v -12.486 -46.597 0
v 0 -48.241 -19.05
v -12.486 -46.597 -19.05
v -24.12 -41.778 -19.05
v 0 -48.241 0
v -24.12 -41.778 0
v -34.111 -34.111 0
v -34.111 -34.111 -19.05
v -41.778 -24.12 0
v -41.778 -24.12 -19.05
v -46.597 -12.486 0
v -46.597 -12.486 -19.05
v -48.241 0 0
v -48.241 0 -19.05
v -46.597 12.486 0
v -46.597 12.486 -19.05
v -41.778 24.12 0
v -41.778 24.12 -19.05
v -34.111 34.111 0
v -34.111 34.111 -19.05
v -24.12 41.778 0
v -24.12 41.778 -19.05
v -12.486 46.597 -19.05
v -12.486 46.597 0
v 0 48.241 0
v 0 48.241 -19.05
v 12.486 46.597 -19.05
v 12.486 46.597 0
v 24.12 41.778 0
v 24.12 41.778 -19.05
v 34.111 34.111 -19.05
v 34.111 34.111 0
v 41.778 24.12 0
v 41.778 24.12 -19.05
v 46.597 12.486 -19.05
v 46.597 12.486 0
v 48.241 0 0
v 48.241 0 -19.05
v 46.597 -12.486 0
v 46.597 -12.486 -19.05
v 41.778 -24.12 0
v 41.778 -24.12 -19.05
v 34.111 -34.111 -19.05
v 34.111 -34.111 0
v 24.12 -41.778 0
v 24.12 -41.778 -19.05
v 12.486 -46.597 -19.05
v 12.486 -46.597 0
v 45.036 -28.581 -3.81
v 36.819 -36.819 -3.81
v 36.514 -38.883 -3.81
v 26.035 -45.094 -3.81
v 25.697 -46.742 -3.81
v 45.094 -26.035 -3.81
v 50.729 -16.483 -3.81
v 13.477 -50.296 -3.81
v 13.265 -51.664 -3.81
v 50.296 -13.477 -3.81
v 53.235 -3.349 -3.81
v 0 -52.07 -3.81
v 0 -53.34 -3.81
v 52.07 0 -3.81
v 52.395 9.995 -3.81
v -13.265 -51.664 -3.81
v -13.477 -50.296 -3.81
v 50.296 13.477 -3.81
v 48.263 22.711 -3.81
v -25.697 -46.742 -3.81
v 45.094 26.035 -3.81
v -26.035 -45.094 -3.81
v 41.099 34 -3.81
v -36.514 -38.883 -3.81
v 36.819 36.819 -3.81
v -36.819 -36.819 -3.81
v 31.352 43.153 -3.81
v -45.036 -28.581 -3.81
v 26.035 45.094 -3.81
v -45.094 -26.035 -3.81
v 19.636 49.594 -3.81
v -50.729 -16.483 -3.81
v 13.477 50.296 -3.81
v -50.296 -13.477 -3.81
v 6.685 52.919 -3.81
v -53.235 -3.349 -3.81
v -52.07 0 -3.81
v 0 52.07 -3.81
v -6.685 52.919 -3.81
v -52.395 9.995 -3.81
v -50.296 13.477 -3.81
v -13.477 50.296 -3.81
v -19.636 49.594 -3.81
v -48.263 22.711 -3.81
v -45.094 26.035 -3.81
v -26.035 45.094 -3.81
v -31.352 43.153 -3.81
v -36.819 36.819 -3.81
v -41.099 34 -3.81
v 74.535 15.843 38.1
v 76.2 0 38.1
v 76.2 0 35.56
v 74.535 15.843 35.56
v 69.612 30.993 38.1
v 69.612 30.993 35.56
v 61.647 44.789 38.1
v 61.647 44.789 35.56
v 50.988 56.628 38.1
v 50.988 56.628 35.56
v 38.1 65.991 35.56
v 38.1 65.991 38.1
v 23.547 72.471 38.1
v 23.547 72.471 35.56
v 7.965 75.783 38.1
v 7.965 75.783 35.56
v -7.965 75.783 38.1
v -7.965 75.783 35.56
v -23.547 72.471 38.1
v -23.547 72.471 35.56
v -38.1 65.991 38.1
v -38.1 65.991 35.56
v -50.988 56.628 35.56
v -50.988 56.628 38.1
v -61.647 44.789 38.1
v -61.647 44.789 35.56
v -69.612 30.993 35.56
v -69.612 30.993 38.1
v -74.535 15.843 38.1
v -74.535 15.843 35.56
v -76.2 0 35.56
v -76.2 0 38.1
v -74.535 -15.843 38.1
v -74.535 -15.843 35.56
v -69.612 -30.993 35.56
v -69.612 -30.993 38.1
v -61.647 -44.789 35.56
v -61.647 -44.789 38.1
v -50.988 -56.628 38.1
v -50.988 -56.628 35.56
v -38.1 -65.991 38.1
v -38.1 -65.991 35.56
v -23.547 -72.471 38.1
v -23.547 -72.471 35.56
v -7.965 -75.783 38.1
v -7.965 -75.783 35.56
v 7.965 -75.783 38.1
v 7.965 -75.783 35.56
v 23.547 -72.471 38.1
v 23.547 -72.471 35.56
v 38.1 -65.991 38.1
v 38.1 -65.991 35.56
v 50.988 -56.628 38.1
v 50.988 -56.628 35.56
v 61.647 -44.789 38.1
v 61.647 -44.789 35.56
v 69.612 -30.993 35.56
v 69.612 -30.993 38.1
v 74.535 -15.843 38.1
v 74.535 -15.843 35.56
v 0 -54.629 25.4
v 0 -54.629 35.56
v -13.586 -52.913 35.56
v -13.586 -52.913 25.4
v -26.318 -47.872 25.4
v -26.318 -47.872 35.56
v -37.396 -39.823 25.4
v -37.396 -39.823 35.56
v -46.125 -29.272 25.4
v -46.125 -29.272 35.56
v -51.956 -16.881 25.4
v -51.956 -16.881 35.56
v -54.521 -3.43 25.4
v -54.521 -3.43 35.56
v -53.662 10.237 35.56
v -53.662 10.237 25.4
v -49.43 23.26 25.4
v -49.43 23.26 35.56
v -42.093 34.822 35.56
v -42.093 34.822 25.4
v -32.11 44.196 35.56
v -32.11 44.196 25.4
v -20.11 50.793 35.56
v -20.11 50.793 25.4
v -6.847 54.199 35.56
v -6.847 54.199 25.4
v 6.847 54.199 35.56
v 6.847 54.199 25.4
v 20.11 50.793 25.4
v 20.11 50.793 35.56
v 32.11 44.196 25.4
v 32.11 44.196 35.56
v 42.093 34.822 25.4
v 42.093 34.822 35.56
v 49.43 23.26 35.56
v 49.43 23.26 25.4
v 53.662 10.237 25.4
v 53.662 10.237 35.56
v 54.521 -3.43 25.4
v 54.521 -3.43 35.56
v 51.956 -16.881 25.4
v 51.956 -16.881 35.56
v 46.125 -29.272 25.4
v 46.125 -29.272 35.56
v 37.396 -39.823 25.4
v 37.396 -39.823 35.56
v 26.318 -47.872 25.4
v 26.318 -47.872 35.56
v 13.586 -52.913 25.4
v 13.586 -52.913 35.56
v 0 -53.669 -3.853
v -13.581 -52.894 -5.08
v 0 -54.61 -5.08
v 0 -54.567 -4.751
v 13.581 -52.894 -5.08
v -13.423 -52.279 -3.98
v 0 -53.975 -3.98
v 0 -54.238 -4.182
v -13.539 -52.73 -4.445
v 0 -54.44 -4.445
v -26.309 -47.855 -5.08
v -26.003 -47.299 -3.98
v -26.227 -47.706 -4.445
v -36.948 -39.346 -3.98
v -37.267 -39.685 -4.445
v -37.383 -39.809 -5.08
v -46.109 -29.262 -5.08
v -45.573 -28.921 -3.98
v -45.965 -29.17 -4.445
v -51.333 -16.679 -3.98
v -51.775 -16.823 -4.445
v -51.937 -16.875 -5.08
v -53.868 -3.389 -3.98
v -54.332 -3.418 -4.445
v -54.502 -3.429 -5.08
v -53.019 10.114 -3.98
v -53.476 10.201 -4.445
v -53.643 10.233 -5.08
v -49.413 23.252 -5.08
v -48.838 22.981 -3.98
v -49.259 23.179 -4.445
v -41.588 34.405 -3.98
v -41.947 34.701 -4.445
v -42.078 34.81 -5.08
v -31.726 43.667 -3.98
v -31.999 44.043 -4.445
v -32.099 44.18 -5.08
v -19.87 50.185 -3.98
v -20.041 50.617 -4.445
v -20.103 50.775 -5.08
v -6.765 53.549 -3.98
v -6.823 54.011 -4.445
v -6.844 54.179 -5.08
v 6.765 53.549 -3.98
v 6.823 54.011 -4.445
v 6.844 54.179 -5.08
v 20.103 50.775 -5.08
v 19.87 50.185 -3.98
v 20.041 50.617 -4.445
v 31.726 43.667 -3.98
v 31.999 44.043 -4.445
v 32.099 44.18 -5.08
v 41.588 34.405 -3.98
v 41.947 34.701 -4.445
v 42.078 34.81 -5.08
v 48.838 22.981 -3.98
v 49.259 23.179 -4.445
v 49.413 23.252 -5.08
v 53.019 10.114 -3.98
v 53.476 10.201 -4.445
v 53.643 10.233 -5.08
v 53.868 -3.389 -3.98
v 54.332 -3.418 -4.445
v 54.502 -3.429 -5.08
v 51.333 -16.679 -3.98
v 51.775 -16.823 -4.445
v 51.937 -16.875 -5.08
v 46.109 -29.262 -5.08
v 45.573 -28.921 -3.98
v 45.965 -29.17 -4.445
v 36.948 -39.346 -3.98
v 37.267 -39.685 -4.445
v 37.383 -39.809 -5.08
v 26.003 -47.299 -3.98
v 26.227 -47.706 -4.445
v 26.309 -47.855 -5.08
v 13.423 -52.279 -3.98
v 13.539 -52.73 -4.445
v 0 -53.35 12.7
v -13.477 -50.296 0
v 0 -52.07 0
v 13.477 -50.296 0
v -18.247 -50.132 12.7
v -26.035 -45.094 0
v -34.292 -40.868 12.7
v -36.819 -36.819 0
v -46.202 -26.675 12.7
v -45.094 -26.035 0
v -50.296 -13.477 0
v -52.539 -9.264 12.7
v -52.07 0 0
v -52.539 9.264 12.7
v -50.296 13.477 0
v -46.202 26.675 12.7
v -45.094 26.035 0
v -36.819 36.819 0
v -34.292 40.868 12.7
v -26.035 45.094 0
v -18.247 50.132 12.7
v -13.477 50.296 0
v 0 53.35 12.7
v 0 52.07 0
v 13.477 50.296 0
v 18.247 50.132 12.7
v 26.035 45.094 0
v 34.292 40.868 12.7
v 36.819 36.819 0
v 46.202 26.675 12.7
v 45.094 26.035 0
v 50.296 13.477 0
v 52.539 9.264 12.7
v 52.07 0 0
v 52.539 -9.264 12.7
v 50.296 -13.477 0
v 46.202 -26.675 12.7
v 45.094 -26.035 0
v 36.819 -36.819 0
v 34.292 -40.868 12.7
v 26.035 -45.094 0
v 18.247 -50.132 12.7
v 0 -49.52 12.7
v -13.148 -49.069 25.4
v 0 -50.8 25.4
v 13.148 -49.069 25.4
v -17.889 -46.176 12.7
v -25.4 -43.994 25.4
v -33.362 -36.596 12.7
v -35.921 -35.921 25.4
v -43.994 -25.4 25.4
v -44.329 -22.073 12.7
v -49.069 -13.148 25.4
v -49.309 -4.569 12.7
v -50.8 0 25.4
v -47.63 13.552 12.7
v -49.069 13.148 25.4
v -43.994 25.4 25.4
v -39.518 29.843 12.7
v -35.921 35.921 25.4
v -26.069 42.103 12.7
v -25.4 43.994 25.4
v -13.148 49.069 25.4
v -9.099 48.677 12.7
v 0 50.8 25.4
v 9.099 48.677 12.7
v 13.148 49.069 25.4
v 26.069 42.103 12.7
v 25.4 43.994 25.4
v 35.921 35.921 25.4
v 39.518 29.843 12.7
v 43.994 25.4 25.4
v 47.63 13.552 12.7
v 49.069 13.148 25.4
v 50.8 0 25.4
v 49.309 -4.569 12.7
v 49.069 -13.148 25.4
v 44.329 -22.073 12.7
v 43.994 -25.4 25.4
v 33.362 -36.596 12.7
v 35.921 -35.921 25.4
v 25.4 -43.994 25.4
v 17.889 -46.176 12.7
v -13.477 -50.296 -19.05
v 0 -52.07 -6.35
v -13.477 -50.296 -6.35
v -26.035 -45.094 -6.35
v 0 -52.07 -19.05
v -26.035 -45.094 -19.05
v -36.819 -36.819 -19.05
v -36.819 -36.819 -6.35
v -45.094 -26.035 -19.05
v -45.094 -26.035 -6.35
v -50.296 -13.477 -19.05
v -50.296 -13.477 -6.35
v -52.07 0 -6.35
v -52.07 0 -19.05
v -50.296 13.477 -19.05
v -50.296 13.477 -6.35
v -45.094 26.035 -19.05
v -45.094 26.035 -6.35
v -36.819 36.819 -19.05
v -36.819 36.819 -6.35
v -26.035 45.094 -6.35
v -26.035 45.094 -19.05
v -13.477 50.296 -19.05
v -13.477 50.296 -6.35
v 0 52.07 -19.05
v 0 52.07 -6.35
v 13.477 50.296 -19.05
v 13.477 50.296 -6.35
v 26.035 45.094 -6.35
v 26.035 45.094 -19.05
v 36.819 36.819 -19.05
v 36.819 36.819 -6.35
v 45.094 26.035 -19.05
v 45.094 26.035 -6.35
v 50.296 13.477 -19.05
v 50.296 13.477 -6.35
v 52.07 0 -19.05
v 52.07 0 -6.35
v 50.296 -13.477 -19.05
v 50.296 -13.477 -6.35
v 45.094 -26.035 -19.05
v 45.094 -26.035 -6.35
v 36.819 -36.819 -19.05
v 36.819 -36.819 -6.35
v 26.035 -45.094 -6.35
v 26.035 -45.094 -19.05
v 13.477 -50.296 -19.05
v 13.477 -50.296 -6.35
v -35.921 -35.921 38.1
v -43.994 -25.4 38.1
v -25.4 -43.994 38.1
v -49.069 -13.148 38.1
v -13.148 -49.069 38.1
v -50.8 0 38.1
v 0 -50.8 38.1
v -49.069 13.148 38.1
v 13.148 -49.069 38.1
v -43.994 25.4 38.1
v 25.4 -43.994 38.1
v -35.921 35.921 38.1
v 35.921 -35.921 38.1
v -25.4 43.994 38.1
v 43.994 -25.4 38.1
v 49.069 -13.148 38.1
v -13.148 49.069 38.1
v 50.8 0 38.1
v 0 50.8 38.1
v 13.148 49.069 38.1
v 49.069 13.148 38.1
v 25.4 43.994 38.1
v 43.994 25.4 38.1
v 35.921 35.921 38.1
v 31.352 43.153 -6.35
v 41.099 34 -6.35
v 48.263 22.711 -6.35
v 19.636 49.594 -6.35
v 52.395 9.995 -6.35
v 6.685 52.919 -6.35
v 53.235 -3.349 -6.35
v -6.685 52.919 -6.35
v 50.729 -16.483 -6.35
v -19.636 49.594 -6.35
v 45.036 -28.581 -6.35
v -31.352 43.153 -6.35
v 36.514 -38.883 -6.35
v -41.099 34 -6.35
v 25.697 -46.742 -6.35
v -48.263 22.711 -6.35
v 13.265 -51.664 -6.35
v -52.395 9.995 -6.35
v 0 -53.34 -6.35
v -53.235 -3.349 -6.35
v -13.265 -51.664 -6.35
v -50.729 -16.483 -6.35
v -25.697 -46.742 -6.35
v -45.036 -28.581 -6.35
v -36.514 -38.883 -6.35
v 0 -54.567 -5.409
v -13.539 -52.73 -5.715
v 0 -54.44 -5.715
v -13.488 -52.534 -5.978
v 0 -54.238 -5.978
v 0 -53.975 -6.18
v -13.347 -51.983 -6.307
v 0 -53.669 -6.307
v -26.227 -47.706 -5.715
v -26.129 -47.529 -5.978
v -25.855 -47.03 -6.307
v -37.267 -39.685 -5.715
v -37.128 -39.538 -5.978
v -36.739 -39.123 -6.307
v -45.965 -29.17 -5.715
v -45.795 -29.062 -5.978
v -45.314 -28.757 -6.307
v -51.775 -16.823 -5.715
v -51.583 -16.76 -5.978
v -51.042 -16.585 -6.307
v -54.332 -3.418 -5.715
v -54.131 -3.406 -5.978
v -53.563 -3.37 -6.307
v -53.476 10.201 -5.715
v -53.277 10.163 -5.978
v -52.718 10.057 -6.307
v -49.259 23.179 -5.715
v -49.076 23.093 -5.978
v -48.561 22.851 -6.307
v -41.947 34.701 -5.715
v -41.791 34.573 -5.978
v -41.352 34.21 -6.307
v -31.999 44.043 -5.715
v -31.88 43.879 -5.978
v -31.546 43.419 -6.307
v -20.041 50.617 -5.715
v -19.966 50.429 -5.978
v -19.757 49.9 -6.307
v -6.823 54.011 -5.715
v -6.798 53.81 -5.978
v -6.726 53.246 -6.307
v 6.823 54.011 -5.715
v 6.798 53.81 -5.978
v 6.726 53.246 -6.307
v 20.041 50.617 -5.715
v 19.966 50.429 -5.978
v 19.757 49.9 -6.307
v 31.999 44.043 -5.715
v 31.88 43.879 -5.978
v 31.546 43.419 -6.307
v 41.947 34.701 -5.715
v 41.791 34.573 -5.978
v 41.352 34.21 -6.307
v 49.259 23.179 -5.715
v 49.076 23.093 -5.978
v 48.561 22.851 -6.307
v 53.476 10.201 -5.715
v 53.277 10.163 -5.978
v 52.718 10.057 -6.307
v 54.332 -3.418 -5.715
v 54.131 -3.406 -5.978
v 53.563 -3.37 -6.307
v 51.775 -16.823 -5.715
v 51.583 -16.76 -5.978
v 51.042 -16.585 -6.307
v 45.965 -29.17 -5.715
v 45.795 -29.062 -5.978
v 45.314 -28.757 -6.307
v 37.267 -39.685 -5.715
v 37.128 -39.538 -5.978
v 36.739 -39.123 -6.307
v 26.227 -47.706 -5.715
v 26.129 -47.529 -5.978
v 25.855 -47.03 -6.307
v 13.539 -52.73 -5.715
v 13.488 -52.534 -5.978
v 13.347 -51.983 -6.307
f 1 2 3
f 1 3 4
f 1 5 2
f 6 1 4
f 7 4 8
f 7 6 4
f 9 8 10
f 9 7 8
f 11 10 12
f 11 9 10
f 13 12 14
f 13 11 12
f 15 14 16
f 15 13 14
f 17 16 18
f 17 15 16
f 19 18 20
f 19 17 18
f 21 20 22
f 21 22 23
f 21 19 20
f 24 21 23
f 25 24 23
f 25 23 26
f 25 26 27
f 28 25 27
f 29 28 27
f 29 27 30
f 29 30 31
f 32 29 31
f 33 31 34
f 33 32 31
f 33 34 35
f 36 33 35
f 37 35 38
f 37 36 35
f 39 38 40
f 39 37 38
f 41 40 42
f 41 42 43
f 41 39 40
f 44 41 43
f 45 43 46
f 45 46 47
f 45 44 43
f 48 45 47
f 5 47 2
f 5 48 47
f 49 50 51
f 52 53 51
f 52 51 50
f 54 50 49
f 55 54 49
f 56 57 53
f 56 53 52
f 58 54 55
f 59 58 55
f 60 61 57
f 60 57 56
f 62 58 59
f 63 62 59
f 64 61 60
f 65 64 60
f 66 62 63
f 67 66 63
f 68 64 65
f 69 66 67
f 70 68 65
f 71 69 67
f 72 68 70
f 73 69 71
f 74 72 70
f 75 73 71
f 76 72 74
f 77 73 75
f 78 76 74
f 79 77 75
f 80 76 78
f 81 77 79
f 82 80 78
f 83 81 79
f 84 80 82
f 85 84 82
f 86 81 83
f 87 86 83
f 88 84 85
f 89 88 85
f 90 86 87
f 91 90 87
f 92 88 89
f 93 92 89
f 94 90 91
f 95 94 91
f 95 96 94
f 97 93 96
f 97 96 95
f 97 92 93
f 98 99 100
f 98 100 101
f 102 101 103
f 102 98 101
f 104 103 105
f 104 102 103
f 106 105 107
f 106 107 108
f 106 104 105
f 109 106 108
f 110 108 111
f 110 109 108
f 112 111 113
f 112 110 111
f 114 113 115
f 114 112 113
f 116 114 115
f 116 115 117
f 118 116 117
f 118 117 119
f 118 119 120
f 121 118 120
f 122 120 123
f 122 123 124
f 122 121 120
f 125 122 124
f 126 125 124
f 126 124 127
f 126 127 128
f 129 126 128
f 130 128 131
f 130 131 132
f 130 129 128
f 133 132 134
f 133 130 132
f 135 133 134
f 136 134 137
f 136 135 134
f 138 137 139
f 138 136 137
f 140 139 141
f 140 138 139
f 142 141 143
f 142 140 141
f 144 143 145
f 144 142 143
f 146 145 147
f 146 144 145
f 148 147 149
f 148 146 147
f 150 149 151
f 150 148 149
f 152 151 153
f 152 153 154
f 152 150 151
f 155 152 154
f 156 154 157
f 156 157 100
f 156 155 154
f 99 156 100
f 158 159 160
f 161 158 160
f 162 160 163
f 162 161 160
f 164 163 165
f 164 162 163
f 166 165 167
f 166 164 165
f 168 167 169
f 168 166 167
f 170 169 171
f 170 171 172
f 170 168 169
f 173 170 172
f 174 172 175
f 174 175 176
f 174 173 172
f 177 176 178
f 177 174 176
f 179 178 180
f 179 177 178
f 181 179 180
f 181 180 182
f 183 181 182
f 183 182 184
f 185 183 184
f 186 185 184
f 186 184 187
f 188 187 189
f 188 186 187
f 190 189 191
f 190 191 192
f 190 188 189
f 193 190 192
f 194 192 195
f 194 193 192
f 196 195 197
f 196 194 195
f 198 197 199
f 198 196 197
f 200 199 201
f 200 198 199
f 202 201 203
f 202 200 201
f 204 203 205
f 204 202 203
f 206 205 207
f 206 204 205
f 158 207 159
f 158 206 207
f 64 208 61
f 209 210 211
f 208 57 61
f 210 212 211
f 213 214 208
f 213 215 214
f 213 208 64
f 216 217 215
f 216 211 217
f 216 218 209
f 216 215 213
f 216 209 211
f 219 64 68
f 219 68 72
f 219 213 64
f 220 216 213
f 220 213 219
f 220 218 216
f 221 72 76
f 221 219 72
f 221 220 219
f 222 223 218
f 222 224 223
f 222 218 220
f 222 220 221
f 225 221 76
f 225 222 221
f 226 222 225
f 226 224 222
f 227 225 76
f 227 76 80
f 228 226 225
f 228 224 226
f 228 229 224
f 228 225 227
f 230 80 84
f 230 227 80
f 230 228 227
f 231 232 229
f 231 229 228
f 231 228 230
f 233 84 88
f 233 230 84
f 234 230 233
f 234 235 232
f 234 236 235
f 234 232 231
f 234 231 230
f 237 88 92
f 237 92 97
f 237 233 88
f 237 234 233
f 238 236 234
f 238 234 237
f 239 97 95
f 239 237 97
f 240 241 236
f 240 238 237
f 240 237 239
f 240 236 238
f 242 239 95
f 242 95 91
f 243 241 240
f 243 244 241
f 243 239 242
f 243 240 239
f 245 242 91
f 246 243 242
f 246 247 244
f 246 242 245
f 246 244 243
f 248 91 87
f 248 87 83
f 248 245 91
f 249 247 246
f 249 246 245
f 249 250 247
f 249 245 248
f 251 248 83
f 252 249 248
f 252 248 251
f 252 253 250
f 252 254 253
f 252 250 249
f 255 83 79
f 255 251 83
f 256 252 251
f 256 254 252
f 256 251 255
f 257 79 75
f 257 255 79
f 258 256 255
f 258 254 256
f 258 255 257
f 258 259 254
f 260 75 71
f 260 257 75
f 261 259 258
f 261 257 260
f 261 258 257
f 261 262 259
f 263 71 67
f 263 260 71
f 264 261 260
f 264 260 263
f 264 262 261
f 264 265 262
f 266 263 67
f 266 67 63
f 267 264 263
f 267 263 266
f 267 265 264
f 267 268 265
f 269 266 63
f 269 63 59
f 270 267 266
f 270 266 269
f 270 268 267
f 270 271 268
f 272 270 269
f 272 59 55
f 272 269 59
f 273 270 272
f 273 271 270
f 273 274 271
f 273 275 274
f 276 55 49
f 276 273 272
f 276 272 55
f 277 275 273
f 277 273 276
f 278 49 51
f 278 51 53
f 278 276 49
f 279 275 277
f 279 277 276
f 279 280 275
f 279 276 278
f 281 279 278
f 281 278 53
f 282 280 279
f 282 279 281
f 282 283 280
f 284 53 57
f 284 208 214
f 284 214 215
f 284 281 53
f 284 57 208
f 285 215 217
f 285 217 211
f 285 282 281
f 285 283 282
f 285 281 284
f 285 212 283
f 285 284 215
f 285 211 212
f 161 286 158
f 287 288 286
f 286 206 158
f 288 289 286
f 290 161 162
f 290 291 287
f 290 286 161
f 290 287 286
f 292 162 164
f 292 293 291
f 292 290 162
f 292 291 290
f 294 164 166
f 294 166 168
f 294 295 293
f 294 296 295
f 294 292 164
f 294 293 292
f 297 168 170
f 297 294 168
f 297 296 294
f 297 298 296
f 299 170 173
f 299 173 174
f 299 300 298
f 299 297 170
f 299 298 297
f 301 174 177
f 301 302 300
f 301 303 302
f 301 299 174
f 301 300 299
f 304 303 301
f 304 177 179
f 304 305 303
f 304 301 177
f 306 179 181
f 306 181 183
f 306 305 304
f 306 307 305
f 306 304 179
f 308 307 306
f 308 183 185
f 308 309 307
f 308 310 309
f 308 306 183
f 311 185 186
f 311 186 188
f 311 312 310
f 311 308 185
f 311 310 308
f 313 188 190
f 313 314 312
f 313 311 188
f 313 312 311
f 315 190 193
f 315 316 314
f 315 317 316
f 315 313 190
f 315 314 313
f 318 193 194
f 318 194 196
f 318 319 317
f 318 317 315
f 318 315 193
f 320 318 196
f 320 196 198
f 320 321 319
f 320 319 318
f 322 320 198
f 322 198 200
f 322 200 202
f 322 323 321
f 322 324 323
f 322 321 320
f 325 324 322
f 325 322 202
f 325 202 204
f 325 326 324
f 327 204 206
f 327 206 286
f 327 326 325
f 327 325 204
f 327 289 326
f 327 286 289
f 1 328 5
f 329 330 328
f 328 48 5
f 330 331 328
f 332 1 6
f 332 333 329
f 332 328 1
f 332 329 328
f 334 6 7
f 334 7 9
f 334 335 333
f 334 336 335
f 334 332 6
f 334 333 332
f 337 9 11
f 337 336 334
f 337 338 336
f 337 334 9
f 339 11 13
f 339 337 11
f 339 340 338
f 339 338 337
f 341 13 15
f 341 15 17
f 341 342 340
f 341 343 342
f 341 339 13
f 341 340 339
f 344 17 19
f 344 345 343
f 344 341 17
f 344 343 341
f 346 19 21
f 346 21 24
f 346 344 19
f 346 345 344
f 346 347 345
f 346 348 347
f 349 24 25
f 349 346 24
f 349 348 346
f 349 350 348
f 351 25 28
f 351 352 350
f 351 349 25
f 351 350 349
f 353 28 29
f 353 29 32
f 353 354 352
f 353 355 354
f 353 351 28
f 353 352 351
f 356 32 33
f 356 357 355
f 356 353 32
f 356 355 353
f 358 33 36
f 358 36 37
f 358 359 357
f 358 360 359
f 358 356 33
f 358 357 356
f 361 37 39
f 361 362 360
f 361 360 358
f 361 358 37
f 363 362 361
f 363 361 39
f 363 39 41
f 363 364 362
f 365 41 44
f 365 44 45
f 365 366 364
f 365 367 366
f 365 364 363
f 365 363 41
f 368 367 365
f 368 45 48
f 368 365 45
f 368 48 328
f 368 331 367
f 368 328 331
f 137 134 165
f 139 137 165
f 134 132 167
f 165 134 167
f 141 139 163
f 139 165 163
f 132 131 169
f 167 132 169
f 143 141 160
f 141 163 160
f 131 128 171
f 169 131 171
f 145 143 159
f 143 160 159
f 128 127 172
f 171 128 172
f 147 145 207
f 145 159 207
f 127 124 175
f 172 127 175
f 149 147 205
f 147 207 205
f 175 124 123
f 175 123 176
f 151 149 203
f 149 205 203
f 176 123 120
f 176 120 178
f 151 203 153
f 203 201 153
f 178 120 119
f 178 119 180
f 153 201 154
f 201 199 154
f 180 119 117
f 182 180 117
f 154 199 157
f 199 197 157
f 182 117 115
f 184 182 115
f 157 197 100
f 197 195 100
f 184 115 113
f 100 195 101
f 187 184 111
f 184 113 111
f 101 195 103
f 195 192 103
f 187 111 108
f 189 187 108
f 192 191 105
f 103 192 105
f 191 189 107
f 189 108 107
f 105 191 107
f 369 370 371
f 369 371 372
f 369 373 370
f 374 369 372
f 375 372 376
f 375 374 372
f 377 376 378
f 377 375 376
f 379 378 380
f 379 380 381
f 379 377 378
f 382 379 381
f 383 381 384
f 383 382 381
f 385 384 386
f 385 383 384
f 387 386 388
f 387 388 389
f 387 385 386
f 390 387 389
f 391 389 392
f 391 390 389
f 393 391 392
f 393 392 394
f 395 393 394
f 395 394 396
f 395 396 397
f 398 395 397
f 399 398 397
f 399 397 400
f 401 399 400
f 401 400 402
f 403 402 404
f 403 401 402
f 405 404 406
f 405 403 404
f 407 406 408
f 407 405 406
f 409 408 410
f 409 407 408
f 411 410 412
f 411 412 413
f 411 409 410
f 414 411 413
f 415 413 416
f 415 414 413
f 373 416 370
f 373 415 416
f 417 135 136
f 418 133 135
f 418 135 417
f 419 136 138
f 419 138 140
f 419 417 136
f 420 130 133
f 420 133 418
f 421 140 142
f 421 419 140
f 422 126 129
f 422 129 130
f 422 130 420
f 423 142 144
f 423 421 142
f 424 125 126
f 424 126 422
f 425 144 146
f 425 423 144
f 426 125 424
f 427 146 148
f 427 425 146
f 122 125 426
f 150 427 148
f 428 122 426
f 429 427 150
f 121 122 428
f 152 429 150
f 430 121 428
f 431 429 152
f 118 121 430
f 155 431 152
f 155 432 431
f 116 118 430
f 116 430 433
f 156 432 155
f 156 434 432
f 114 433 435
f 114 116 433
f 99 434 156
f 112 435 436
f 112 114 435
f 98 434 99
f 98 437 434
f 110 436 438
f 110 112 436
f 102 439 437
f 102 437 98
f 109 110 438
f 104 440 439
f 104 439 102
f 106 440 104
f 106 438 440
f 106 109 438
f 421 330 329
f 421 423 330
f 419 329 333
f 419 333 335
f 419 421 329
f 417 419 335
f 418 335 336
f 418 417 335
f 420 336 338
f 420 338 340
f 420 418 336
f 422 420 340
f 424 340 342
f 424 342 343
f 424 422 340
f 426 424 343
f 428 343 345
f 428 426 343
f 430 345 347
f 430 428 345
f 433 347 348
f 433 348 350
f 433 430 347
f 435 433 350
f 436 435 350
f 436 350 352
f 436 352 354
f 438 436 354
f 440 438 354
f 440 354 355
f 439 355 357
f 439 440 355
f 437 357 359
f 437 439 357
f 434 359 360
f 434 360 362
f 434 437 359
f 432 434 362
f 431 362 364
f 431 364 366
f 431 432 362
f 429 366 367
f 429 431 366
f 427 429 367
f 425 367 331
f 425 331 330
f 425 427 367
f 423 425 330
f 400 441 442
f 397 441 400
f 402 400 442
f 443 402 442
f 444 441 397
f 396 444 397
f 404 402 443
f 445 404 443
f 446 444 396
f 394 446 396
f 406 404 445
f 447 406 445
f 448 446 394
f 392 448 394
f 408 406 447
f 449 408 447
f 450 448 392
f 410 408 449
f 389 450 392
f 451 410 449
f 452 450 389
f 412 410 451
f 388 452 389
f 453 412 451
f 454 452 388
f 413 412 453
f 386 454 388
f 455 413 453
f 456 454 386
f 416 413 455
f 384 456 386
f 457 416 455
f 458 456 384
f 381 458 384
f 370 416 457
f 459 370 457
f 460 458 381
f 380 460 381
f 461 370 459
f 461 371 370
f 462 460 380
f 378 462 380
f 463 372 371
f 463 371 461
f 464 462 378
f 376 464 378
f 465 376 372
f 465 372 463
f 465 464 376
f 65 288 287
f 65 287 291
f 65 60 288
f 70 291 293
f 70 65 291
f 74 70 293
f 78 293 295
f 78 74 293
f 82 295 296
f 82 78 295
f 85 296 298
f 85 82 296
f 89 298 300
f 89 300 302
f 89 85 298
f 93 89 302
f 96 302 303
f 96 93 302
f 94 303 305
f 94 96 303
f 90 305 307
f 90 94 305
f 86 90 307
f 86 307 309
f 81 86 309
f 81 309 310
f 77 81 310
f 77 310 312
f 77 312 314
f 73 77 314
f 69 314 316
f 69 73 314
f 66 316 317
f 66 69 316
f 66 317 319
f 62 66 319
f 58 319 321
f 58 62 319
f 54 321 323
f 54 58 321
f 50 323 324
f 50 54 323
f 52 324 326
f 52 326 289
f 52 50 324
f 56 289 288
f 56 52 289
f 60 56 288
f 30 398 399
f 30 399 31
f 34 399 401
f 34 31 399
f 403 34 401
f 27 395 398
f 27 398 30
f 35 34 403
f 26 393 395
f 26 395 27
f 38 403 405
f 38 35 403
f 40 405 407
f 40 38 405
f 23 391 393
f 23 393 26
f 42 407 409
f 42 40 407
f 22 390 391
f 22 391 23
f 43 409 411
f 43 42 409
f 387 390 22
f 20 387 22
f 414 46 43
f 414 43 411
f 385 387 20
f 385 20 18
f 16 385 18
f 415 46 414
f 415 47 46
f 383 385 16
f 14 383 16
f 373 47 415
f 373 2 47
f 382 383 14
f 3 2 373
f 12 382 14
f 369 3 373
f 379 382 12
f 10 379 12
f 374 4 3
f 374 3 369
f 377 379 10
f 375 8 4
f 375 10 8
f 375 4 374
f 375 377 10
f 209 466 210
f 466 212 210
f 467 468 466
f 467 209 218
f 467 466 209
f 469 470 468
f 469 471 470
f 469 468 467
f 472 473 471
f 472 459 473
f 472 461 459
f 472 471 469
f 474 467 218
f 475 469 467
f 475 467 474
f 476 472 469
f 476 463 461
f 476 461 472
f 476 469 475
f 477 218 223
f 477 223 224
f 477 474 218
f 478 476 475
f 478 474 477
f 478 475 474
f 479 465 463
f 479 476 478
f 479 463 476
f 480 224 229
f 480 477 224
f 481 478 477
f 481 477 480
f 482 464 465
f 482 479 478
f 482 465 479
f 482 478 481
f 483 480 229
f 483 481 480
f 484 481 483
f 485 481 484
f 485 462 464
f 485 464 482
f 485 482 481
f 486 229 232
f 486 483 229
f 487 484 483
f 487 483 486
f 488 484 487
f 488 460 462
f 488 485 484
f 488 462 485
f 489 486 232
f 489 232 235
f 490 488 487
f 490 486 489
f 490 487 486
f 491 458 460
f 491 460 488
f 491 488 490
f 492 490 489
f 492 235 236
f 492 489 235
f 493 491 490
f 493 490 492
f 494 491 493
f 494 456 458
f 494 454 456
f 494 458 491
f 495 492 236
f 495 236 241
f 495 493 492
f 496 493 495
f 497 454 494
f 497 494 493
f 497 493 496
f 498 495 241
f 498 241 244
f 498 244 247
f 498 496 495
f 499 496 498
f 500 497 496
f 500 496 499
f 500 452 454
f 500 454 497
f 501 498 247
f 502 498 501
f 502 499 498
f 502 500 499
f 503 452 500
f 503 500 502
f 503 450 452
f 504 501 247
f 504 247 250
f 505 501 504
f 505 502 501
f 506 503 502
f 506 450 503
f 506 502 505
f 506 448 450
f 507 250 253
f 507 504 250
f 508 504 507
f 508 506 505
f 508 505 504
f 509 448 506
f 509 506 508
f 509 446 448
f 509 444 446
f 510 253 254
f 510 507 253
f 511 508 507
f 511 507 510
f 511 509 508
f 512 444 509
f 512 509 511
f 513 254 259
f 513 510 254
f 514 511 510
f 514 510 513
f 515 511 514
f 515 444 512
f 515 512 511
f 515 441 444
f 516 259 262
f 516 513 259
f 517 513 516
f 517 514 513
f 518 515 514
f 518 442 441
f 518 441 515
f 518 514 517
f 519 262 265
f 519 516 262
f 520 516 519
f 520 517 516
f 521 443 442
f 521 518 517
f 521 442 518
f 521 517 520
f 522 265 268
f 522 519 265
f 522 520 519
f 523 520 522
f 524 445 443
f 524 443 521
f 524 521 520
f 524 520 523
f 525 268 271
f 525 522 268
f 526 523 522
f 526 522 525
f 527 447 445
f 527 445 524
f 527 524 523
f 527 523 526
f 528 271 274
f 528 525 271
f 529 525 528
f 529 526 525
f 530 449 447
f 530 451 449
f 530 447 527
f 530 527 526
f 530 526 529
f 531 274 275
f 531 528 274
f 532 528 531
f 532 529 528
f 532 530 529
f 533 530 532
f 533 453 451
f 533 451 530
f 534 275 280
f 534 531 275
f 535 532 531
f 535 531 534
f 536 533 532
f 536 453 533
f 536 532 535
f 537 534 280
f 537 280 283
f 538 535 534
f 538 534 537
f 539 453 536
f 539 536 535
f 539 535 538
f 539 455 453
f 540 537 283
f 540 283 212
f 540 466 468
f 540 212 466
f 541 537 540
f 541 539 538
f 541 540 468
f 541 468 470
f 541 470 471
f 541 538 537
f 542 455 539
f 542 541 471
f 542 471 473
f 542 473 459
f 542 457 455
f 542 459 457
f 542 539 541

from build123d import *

# Parameters (mm, degrees)
F2_R     = 76.2
F2_R_2   = 54.6292916326
F2_R_3   = 52.1095022643
F3_DEPTH = 2.54
F4_R     = 1.26999


# Not quite as in the source:
# - a fillet or chamfer is up to 0.001 mm smaller than in the source, because OpenCascade refuses the exact size


with BuildPart() as f1:
    # F0 (on Right) → F1 (revolve)
    with BuildSketch(Plane.YZ):
        Polygon((-48.2407083674, -19.05), (-48.2407083674, 0), (-50.8, 25.4), (-50.8, 38.1), (-54.6292916326, 38.1), (-54.6292916326, 25.4), (-52.07, 0), (-52.07, -3.81), (-54.61, -3.81), (-54.61, -6.35), (-52.07, -6.35), (-52.07, -19.05), align=None)
    revolve(axis=Axis((0, 0, 19.0012101084), (0, 0, -1)))

    # F2 (on face) → F3 (join)
    with BuildSketch(Plane.XY.offset(38.1)):
        Circle(F2_R)
        Circle(F2_R_2, mode=Mode.SUBTRACT)
        Circle(F2_R_2)
        Circle(F2_R_3, mode=Mode.SUBTRACT)
    extrude(amount=-F3_DEPTH)

    # F4 (radius 1.27 in the source; OpenCascade refuses exactly that, so slightly less here)
    f4_edges = [f1.edges().sort_by_distance(p)[0] for p in [
        (0, 54.61, -3.81),
        (0, 54.61, -6.35),
    ]]
    fillet(f4_edges, radius=F4_R)


solid = f1.part
